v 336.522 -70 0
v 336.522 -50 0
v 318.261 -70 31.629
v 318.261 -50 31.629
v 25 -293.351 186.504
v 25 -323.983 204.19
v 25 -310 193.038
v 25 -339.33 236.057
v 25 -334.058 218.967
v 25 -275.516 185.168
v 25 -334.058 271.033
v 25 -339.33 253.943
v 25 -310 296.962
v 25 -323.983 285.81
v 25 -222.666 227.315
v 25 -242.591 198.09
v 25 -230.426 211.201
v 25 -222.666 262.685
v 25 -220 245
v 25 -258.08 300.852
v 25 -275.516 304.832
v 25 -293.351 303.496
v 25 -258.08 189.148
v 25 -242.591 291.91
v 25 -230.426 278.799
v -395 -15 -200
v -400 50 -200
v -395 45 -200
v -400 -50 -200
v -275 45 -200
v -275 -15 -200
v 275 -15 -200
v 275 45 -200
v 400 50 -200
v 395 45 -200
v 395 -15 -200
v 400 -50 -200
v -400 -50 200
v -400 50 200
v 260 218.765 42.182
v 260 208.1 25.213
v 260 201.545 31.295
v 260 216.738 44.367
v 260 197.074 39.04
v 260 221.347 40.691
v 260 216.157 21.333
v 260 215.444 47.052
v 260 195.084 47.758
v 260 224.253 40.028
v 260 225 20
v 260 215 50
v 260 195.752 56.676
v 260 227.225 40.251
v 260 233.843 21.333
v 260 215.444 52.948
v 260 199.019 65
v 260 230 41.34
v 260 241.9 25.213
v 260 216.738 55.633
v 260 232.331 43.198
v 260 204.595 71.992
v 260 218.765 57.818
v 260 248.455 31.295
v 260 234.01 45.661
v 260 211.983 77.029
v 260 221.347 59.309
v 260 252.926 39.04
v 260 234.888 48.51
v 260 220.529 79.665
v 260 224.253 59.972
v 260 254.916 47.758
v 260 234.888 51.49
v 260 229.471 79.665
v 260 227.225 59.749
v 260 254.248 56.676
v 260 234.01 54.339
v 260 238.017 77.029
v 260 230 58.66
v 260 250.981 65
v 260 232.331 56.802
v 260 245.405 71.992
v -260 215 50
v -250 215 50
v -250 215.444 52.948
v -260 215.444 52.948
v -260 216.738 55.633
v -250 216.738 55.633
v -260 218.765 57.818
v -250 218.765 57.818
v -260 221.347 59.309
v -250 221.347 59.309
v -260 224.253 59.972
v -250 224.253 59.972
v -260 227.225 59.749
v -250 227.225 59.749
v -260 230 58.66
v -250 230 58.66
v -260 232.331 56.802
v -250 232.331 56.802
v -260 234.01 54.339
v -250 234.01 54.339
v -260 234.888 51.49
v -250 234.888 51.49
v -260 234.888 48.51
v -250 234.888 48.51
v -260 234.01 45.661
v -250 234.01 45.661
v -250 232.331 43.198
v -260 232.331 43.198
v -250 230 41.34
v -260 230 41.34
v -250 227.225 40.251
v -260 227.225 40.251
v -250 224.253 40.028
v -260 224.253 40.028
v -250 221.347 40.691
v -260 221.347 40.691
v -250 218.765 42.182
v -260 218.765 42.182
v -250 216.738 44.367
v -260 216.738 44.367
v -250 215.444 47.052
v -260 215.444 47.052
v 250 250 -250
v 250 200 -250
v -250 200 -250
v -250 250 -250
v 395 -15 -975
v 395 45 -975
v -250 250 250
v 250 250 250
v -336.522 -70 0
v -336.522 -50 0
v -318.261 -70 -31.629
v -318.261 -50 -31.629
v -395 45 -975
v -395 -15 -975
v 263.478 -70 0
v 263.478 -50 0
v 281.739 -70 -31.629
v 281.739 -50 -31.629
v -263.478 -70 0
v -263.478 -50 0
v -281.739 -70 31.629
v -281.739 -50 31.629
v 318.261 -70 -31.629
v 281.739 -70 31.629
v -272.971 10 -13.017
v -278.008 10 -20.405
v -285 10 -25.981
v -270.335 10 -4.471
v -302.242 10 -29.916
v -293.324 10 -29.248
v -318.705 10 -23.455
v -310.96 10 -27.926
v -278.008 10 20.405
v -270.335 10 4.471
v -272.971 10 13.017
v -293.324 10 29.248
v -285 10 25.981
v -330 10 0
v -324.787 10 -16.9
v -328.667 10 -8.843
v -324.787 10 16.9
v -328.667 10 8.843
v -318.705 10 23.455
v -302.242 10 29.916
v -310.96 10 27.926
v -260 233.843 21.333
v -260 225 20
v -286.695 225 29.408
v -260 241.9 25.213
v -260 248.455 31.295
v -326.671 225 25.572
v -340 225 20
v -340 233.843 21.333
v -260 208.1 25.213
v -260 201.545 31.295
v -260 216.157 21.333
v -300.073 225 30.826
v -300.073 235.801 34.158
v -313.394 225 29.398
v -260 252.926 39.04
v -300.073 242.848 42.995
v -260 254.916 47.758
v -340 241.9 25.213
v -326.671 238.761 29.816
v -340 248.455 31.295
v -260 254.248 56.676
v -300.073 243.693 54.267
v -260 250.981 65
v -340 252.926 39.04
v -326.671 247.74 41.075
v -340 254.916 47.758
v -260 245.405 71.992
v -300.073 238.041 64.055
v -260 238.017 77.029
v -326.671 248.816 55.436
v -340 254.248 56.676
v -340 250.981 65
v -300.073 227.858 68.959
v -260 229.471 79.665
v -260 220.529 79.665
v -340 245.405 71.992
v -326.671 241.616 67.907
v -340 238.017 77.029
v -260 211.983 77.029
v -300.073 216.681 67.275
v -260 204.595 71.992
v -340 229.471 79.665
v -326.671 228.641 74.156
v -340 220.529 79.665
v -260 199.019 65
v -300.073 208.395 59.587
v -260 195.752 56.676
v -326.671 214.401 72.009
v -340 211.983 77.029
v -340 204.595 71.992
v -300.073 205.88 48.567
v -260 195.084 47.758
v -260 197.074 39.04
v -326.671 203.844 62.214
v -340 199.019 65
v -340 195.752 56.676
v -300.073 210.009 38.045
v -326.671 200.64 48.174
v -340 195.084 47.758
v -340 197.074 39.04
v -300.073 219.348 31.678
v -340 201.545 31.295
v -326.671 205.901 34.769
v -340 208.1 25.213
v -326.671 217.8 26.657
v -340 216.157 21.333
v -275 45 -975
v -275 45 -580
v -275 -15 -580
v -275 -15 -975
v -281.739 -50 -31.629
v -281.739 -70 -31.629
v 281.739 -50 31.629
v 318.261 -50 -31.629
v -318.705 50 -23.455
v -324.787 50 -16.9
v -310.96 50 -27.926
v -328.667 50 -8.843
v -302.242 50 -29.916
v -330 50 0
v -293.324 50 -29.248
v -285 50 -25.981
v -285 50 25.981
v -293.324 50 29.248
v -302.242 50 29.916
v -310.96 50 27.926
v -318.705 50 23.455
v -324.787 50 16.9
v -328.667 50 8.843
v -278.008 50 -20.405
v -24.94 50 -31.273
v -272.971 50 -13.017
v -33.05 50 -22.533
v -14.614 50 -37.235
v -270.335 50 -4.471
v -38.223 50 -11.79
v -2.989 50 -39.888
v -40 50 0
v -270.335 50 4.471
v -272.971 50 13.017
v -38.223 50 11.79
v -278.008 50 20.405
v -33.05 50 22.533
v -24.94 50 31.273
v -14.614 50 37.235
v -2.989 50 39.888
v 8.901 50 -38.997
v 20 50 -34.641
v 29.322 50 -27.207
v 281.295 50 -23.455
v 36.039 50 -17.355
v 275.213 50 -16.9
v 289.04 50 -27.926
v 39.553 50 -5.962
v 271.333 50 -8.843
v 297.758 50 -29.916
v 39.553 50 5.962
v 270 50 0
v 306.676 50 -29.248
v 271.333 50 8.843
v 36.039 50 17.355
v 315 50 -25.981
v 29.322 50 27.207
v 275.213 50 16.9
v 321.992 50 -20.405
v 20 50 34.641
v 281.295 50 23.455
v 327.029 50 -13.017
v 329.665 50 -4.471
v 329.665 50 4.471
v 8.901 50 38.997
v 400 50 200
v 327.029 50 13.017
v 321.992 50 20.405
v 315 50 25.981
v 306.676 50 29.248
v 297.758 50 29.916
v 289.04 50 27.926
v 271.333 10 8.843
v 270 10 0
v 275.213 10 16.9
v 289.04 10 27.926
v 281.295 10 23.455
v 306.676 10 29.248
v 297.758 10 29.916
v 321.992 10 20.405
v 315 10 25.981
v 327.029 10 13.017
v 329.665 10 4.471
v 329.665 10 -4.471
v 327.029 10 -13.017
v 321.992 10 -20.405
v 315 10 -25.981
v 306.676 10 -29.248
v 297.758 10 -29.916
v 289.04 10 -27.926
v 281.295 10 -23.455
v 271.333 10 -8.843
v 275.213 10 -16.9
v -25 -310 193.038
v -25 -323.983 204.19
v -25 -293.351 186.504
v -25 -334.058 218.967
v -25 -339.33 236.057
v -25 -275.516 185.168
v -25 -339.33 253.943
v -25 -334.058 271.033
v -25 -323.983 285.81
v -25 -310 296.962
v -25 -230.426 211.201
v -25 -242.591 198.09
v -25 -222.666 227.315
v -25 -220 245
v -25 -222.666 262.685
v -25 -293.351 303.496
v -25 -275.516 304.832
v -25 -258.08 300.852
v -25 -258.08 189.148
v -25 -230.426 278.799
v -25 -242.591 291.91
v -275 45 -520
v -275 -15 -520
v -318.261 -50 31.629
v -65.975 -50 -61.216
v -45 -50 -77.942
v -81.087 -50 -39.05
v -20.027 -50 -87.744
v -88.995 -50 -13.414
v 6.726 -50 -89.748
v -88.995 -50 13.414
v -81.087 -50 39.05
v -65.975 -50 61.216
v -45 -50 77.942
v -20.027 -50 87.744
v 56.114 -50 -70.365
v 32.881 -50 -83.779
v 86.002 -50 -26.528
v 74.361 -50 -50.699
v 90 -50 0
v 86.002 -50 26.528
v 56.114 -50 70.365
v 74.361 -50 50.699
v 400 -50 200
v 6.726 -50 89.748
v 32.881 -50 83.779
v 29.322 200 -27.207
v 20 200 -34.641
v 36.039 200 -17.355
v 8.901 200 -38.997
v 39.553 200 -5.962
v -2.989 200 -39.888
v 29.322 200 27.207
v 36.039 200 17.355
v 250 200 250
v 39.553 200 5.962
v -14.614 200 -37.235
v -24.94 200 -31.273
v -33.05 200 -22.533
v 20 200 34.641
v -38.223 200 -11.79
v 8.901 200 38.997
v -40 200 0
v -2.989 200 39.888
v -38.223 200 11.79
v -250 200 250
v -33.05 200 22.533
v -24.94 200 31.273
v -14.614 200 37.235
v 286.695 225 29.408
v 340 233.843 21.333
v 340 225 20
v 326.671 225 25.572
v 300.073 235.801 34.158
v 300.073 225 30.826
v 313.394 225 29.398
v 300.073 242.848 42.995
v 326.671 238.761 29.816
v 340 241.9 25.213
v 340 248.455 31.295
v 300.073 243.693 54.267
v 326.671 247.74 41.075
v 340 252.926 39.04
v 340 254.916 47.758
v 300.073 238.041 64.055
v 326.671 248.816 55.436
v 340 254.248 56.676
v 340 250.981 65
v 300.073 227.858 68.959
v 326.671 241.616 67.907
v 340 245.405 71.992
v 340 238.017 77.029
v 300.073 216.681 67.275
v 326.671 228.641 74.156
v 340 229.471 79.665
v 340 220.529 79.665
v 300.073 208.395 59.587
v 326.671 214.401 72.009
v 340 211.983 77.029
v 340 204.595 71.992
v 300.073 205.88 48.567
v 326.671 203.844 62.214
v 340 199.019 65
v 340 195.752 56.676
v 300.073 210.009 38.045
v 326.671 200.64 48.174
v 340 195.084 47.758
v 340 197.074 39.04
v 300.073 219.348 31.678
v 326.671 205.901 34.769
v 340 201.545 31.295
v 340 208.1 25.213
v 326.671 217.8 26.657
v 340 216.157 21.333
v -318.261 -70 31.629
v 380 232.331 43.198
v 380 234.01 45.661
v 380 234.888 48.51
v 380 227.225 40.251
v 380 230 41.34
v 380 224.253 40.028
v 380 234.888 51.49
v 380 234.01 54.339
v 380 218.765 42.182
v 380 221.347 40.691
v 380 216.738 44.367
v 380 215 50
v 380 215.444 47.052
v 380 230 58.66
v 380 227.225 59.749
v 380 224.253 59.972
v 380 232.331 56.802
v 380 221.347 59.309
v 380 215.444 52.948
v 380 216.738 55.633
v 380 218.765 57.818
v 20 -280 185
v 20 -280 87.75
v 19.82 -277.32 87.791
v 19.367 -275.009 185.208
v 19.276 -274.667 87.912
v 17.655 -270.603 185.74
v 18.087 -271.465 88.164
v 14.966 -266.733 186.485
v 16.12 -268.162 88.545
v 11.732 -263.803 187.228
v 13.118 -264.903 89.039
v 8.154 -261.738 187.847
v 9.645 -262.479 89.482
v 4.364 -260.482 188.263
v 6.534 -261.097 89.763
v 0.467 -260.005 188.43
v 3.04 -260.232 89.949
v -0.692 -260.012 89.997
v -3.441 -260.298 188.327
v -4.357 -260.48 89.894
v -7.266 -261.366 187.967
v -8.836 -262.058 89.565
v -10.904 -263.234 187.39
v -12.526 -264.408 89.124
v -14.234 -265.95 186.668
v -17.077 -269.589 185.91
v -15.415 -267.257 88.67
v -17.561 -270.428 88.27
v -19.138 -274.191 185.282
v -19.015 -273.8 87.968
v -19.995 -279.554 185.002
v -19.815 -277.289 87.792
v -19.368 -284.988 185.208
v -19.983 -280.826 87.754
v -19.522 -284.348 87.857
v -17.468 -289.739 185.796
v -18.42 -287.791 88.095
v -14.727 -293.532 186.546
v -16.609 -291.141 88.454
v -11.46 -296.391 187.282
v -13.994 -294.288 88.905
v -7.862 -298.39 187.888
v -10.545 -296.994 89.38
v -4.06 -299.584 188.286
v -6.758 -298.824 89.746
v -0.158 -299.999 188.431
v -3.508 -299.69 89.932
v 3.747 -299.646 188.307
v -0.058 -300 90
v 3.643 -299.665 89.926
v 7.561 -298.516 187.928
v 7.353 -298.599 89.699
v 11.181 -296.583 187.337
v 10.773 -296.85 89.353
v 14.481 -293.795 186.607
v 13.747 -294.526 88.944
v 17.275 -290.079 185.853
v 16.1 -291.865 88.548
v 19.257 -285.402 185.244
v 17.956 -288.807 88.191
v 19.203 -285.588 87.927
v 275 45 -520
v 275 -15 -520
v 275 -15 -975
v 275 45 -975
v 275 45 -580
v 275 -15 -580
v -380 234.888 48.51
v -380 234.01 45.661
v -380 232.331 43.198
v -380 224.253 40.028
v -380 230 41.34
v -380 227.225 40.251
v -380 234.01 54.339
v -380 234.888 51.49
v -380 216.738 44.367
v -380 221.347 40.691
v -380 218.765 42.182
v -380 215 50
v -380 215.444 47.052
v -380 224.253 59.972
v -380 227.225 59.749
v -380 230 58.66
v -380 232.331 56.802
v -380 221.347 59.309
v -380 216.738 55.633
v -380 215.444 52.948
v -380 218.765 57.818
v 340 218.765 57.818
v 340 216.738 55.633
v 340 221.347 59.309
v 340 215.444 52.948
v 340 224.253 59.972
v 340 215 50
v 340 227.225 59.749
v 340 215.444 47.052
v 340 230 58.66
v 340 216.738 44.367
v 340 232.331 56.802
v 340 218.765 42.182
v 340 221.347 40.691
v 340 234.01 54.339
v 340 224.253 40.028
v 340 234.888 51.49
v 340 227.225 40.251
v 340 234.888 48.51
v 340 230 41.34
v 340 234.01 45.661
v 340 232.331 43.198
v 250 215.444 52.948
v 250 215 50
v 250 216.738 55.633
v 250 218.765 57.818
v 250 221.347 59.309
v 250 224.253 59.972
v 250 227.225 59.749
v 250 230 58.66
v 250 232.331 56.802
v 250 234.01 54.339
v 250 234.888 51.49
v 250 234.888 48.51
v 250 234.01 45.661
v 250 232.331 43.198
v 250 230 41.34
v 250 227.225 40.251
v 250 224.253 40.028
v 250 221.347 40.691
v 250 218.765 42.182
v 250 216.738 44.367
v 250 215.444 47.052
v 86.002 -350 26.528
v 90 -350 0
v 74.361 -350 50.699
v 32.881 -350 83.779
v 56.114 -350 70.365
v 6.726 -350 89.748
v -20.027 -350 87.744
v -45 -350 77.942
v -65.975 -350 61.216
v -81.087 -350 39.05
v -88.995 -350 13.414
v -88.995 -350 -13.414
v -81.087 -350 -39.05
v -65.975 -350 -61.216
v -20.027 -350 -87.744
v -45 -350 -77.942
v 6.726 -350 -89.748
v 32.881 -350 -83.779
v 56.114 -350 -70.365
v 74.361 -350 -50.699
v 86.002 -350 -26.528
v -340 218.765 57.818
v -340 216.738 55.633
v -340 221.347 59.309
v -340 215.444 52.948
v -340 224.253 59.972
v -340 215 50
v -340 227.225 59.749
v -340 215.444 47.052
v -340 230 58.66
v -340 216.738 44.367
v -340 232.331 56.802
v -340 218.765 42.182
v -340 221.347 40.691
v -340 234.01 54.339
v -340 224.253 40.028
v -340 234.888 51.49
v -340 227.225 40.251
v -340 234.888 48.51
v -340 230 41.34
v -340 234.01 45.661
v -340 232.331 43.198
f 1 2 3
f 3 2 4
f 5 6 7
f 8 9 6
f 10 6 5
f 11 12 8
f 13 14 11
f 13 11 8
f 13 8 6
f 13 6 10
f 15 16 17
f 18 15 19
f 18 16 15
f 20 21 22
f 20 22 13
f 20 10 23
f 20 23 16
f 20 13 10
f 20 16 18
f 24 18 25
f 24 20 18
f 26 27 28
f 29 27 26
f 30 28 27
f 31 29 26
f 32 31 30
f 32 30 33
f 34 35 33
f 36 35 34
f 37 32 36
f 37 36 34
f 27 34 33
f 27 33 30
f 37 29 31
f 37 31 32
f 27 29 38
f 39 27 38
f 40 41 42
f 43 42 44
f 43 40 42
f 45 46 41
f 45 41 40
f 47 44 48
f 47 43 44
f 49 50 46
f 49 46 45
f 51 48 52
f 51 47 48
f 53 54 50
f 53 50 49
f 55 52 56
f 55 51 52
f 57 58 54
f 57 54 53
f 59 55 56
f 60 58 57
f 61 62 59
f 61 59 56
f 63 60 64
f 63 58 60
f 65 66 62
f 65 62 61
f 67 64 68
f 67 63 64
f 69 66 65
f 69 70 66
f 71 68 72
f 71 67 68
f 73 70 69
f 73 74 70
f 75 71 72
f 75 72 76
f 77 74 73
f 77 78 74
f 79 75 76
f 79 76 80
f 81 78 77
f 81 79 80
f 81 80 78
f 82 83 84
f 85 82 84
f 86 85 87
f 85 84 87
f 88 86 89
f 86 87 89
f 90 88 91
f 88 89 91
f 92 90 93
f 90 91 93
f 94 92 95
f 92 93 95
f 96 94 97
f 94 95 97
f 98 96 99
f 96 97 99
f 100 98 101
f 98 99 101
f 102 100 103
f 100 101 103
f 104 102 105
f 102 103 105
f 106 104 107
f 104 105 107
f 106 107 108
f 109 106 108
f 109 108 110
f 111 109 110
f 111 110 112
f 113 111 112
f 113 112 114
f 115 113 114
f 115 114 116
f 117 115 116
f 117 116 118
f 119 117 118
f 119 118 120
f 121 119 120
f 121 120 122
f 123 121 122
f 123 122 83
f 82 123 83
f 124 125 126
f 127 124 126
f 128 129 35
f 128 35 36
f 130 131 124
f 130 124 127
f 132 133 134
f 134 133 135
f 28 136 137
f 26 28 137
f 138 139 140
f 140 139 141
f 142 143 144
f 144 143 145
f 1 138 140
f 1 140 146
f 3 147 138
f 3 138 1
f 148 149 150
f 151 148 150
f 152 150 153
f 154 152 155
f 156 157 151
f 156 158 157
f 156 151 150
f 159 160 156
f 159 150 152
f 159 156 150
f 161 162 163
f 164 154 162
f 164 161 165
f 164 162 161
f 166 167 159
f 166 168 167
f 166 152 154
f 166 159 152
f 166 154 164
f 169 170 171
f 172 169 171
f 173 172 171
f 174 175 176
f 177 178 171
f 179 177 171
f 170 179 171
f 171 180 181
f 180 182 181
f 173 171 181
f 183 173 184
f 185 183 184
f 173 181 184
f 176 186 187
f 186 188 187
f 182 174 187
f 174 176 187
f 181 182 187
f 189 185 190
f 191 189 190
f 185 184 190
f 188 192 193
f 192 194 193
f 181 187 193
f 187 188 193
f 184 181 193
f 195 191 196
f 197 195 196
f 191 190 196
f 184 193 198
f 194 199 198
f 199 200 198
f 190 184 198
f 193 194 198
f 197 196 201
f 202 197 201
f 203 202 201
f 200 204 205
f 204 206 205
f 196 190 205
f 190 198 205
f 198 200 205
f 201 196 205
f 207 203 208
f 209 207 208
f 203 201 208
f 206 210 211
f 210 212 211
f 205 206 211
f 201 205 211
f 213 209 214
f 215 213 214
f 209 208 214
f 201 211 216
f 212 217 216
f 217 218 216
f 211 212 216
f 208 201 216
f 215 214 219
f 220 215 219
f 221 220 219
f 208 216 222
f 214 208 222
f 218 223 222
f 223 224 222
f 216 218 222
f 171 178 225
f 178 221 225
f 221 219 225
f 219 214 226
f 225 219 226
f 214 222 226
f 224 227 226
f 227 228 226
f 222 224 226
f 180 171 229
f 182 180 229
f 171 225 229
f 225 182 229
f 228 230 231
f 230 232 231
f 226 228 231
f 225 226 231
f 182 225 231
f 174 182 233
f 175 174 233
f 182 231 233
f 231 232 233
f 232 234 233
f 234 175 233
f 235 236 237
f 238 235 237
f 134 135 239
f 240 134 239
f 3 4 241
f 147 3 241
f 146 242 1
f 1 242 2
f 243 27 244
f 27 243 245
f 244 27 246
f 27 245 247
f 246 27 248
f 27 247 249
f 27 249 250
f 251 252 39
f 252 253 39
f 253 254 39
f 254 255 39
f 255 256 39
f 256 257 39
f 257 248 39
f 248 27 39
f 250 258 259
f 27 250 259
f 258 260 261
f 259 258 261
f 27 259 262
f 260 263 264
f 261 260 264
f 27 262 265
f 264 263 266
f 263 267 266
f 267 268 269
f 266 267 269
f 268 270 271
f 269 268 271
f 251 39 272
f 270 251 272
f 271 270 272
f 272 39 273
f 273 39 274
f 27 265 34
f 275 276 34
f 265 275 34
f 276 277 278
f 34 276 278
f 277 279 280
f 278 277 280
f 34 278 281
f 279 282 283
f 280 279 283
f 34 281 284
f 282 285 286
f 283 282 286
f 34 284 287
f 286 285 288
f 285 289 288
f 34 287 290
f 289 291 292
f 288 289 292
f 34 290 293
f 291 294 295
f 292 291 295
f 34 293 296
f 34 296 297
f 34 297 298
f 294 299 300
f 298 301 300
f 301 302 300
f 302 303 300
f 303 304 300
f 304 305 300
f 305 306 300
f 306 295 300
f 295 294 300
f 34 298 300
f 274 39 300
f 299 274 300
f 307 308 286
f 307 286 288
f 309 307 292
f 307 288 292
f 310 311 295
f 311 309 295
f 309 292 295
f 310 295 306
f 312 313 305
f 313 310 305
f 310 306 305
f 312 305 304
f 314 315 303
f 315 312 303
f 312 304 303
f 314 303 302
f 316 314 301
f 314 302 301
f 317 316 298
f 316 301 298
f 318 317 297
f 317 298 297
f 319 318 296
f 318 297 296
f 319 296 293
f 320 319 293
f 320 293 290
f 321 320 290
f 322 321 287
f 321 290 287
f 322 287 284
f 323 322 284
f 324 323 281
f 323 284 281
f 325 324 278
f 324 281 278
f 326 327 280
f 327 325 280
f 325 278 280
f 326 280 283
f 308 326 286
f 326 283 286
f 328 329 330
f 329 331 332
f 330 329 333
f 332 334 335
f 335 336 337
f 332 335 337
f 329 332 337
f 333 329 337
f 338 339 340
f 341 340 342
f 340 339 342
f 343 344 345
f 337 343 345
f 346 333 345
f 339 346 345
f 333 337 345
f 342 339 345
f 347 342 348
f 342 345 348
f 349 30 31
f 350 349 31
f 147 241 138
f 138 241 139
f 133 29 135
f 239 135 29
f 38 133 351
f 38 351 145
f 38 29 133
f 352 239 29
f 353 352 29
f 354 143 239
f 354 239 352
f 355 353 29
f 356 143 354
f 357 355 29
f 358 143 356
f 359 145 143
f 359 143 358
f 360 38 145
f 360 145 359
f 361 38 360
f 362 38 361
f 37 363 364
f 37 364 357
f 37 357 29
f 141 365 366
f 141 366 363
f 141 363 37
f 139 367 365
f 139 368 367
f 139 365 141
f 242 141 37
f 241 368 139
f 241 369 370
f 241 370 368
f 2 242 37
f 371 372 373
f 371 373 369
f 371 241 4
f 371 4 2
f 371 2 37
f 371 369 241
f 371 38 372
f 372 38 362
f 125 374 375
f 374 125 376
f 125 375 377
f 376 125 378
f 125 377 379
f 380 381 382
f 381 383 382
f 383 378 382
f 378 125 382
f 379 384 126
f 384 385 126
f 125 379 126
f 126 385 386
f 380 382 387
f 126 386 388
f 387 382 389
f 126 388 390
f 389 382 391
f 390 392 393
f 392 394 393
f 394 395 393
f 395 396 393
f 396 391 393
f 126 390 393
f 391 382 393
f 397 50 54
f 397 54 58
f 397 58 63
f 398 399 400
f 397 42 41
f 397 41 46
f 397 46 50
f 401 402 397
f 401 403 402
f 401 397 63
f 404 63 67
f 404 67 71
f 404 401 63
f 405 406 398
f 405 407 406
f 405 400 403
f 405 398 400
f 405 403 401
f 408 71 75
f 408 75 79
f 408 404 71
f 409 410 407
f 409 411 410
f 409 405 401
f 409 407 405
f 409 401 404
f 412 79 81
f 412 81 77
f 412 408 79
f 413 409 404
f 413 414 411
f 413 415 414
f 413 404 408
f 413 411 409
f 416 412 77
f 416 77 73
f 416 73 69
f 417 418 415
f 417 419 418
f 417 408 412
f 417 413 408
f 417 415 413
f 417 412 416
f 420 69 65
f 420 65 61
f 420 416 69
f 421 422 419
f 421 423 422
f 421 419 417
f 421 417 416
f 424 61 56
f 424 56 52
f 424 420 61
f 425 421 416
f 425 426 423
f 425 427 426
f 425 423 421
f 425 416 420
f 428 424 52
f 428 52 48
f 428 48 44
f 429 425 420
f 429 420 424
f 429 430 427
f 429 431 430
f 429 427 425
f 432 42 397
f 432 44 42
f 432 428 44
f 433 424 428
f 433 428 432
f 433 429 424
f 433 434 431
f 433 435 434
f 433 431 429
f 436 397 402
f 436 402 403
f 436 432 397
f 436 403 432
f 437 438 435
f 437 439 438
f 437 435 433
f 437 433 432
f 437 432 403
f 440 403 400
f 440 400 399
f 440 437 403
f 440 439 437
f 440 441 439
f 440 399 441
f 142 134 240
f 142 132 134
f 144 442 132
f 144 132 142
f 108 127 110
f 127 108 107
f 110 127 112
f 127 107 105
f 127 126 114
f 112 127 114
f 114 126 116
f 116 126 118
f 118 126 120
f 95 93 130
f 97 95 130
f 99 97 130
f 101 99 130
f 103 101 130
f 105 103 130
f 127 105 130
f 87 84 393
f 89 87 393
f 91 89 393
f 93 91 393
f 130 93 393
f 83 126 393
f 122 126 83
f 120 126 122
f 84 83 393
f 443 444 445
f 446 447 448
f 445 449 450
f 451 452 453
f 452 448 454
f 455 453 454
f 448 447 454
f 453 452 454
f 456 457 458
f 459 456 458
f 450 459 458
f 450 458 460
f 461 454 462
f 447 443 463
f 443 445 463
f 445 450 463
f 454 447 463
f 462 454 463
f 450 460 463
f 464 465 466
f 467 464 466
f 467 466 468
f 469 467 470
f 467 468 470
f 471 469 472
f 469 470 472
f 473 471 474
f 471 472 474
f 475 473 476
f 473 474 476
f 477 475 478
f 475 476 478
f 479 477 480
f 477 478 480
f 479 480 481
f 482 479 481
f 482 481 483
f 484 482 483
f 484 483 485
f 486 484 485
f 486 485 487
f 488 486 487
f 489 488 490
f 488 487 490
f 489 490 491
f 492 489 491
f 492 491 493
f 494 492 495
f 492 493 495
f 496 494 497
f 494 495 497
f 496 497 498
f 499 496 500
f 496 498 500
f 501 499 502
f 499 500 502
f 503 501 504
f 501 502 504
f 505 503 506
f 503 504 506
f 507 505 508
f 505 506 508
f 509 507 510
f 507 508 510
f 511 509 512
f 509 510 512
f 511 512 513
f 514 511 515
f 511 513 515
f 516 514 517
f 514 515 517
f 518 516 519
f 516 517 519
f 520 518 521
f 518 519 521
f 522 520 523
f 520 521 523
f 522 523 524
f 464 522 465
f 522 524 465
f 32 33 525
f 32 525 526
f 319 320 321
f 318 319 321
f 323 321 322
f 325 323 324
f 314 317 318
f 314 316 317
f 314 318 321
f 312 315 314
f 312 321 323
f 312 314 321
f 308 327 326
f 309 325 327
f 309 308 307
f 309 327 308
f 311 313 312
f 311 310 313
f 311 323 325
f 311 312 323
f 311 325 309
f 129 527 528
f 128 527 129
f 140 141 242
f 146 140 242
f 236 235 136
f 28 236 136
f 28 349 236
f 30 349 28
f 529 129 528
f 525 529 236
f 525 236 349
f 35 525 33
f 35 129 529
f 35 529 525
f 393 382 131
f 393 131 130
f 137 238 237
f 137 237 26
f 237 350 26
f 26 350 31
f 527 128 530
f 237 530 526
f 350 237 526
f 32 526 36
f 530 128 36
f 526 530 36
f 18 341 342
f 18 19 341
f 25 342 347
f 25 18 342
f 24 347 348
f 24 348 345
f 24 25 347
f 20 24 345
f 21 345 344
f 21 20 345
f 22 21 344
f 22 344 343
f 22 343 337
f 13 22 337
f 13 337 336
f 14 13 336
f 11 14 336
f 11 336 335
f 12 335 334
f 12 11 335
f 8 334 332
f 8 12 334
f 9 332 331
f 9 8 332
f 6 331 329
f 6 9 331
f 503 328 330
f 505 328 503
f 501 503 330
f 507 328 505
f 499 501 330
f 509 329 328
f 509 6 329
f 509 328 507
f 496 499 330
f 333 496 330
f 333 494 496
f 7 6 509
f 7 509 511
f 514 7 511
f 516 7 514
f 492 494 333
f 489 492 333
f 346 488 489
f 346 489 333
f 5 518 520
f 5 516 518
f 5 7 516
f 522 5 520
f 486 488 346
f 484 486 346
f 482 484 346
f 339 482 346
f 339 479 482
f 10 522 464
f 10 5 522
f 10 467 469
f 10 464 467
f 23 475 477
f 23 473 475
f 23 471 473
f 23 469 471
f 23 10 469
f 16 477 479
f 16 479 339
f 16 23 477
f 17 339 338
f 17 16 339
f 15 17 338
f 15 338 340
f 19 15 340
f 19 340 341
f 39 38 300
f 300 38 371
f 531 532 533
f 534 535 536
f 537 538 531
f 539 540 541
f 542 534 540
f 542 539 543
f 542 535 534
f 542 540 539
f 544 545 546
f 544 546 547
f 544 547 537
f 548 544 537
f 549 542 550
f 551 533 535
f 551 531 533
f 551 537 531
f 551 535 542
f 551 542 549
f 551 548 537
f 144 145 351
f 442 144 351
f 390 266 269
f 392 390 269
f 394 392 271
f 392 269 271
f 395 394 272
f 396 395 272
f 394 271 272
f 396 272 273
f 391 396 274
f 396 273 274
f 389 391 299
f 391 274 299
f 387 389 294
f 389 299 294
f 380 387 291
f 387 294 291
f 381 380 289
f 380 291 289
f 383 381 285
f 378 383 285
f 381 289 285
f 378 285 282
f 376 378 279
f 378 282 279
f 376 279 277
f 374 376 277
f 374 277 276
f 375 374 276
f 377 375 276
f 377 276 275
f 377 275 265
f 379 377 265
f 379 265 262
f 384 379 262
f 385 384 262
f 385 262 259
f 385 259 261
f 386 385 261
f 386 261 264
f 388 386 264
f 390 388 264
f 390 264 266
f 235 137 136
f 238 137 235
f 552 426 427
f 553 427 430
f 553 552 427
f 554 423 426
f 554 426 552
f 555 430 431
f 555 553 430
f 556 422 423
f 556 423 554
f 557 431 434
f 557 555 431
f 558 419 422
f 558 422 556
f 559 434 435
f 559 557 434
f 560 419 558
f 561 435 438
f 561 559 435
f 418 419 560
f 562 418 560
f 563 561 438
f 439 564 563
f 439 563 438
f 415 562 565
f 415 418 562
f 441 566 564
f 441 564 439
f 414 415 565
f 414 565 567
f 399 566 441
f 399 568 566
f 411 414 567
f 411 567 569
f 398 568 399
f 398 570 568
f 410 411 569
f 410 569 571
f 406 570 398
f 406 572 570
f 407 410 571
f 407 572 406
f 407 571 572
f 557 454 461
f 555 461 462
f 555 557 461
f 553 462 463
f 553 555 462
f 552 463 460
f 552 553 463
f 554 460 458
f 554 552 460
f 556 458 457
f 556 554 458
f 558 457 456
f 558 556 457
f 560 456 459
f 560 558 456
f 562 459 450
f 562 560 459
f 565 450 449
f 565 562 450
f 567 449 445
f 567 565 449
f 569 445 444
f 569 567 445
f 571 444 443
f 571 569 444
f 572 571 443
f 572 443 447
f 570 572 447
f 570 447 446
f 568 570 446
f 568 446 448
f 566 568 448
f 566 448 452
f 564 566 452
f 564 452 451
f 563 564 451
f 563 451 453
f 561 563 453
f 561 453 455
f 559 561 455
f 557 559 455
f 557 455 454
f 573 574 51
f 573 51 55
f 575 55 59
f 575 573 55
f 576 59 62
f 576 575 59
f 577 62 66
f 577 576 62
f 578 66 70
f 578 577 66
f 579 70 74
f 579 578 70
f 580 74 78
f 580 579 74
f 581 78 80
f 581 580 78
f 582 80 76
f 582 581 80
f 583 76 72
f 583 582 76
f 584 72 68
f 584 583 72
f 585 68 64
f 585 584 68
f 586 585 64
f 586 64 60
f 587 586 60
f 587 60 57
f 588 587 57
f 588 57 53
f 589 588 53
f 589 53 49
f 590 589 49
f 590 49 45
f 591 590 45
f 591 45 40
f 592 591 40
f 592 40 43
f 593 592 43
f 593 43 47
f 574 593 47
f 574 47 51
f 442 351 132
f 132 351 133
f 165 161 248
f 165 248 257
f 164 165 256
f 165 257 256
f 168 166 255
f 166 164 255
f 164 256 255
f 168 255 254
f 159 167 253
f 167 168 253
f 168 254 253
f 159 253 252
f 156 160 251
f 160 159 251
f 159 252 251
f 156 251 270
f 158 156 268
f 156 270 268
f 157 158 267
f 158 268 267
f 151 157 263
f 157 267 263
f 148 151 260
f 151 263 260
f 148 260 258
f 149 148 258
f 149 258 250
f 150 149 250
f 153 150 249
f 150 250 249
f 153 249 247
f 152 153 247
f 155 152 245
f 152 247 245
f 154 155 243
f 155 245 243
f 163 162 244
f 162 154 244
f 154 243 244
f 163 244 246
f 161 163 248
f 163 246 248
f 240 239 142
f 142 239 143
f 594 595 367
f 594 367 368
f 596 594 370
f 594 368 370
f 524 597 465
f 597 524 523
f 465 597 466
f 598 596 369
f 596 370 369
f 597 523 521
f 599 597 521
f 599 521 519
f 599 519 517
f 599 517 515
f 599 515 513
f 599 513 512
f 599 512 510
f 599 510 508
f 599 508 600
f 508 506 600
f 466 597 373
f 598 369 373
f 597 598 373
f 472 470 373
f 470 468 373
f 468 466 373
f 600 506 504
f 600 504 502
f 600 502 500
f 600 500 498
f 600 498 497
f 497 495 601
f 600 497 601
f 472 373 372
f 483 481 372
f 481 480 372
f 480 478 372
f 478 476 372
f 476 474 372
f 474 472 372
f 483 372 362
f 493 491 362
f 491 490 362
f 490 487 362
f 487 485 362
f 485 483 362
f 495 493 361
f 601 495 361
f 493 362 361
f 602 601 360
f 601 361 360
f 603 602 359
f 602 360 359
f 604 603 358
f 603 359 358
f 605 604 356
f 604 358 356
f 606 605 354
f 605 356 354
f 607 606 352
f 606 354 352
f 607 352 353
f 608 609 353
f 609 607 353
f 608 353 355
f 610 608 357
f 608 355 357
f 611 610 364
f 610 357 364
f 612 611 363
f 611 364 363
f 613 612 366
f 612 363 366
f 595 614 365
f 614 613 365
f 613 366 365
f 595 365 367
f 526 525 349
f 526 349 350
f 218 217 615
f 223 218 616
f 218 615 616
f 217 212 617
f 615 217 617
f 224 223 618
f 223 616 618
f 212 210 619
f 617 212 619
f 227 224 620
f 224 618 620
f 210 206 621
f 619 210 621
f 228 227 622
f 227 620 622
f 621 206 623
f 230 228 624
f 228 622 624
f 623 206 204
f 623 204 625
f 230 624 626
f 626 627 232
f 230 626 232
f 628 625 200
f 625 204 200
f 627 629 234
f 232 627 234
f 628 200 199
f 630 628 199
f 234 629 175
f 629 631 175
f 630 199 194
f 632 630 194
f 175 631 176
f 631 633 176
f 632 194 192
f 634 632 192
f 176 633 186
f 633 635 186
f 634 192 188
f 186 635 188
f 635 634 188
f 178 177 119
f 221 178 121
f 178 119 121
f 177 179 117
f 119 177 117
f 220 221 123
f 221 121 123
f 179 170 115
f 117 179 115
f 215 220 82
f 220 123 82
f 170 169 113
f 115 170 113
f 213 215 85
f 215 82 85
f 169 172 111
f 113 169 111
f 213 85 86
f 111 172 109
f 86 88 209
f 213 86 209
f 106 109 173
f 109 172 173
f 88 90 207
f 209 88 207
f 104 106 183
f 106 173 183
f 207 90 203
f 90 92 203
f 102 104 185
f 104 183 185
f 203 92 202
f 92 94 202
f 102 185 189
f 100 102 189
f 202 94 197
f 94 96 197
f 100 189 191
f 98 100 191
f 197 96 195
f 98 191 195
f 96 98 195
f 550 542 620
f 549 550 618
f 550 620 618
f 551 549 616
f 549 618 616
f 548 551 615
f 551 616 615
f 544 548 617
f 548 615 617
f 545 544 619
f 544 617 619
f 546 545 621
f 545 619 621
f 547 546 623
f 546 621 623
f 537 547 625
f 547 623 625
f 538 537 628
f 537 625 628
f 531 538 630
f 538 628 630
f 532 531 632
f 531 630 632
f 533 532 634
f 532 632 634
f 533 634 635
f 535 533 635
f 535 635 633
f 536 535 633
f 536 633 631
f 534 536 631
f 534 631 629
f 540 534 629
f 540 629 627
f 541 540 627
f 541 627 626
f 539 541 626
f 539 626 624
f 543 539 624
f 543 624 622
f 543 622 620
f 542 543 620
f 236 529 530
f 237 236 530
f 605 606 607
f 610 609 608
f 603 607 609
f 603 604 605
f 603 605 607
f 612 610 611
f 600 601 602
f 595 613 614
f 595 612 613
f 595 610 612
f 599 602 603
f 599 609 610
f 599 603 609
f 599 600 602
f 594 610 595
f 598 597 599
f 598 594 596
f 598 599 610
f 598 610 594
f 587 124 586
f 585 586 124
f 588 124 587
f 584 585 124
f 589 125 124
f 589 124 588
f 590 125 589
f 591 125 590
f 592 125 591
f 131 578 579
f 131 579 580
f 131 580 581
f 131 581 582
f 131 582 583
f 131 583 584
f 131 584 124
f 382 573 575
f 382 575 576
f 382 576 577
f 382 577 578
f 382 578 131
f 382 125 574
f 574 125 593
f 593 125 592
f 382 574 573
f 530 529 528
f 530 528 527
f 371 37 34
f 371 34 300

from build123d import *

# Parameters (mm, degrees)
F0_W      = 800
F0_H      = 400
F1_DEPTH  = 50
F2_R      = 90
F3_DEPTH  = 300
F4_R      = 20
F5_DEPTH  = 200
F6_R      = 60
F7_DEPTH  = 25
F9_DEPTH  = 20
F10_R     = 30
F11_DEPTH = 40
F12_W     = 120
F12_H     = 60
F13_DEPTH = 775
F14_R     = 40
F15_DEPTH = 150
F16_W     = 500
F16_H     = 500
F17_DEPTH = 50
F18_R     = 10
F19_DEPTH = 130
F25_W     = 60
F25_H     = 60
F26_DEPTH = 600


with BuildPart() as f1:
    # F0 (on Front) → F1 (new body, symmetric)
    with BuildSketch(Plane.XZ):
        Rectangle(F0_W, F0_H)
    extrude(amount=F1_DEPTH, both=True)

    # F2 (on face) → F3 (join)
    with BuildSketch(Plane.XZ.offset(50)):
        Circle(F2_R)
    extrude(amount=F3_DEPTH)

    # F4 (on Top) → F5 (join)
    with BuildSketch(Plane.XY):
        with Locations((0, -280)):
            Circle(F4_R)
    extrude(amount=F5_DEPTH)

    # F6 (on Right) → F7 (join, symmetric)
    with BuildSketch(Plane.YZ):
        with Locations((-280, 245)):
            Circle(F6_R)
    extrude(amount=F7_DEPTH, both=True)

    # F8 (on face) → F9 (join)
    with BuildSketch(Plane.XZ.offset(50)):
        Polygon((-318.2610926981, -31.6291403548), (-281.7389073019, -31.6291403548), (-263.4778146039, 0), (-281.7389073019, 31.6291403548), (-318.2610926981, 31.6291403548), (-336.5221853961, 0), align=None)
        Polygon((281.7389073019, 31.6291403548), (263.4778146039, 0), (281.7389073019, -31.6291403548), (318.2610926981, -31.6291403548), (336.5221853961, 0), (318.2610926981, 31.6291403548), align=None)
    extrude(amount=F9_DEPTH)

    # F10 (on face) → F11 (cut)
    with BuildSketch(Plane(origin=(0, 50, 0), x_dir=(-1, 0, 0), z_dir=(0, 1, 0))):
        with Locations((-300, 0)):
            Circle(F10_R)
        with Locations((300, 0)):
            Circle(F10_R)
    extrude(amount=-F11_DEPTH, mode=Mode.SUBTRACT)

    # F12 (on face) → F13 (join)
    with BuildSketch(Plane(origin=(0, 0, -200), x_dir=(1, 0, 0), z_dir=(0, 0, -1))):
        with Locations((335, -15)):
            Rectangle(F12_W, F12_H)
        with Locations((-335, -15)):
            Rectangle(F12_W, F12_H)
    extrude(amount=F13_DEPTH)

    # F14 (on face) → F15 (join)
    with BuildSketch(Plane(origin=(0, 50, 0), x_dir=(-1, 0, 0), z_dir=(0, 1, 0))):
        Circle(F14_R)
    extrude(amount=F15_DEPTH)

    # F16 (on face) → F17 (join)
    with BuildSketch(Plane(origin=(0, 200, 0), x_dir=(-1, 0, 0), z_dir=(0, 1, 0))):
        Rectangle(F16_W, F16_H)
    extrude(amount=F17_DEPTH)

    # F18 (on face) → F19 (join)
    with BuildSketch(Plane(origin=(-250, 0, 0), x_dir=(0, -1, 0), z_dir=(-1, 0, 0))):
        with Locations((-225, 50)):
            Circle(F18_R)
    extrude(amount=F19_DEPTH)

    # F22 (on offset) → F23 (revolve)
    with BuildSketch(Plane(origin=(0, 225, 0), x_dir=(-1, 0, 0), z_dir=(0, 1, 0))):
        with BuildLine():
            Line((340, 40), (260, 40))
            Line((260, 40), (260, 20))
            add(Edge.make_bspline(
                [(260, 20), (273.2887466803, 26.2524876464), (300.1899032178, 35.4131948165), (326.622332785, 26.2265646487), (340, 20)],
                knots=[0, 0, 0, 0, 0.5006142666, 1, 1, 1, 1], degree=3))
            Line((340, 20), (340, 40))
        make_face()
    revolve(axis=Axis((-250, 225, 50), (1, 0, 0)))

    # F24: F1 across plane


with BuildPart() as f1_1:
    add(f1.part)
    add(f1.part.mirror(Plane.YZ))

    # F25 (on face) → F26 (join)
    with BuildSketch(Plane(origin=(275, 0, 0), x_dir=(0, -1, 0), z_dir=(-1, 0, 0))):
        with Locations((-15, -550)):
            Rectangle(F25_W, F25_H)
    extrude(amount=F26_DEPTH)


solid = f1_1.part
